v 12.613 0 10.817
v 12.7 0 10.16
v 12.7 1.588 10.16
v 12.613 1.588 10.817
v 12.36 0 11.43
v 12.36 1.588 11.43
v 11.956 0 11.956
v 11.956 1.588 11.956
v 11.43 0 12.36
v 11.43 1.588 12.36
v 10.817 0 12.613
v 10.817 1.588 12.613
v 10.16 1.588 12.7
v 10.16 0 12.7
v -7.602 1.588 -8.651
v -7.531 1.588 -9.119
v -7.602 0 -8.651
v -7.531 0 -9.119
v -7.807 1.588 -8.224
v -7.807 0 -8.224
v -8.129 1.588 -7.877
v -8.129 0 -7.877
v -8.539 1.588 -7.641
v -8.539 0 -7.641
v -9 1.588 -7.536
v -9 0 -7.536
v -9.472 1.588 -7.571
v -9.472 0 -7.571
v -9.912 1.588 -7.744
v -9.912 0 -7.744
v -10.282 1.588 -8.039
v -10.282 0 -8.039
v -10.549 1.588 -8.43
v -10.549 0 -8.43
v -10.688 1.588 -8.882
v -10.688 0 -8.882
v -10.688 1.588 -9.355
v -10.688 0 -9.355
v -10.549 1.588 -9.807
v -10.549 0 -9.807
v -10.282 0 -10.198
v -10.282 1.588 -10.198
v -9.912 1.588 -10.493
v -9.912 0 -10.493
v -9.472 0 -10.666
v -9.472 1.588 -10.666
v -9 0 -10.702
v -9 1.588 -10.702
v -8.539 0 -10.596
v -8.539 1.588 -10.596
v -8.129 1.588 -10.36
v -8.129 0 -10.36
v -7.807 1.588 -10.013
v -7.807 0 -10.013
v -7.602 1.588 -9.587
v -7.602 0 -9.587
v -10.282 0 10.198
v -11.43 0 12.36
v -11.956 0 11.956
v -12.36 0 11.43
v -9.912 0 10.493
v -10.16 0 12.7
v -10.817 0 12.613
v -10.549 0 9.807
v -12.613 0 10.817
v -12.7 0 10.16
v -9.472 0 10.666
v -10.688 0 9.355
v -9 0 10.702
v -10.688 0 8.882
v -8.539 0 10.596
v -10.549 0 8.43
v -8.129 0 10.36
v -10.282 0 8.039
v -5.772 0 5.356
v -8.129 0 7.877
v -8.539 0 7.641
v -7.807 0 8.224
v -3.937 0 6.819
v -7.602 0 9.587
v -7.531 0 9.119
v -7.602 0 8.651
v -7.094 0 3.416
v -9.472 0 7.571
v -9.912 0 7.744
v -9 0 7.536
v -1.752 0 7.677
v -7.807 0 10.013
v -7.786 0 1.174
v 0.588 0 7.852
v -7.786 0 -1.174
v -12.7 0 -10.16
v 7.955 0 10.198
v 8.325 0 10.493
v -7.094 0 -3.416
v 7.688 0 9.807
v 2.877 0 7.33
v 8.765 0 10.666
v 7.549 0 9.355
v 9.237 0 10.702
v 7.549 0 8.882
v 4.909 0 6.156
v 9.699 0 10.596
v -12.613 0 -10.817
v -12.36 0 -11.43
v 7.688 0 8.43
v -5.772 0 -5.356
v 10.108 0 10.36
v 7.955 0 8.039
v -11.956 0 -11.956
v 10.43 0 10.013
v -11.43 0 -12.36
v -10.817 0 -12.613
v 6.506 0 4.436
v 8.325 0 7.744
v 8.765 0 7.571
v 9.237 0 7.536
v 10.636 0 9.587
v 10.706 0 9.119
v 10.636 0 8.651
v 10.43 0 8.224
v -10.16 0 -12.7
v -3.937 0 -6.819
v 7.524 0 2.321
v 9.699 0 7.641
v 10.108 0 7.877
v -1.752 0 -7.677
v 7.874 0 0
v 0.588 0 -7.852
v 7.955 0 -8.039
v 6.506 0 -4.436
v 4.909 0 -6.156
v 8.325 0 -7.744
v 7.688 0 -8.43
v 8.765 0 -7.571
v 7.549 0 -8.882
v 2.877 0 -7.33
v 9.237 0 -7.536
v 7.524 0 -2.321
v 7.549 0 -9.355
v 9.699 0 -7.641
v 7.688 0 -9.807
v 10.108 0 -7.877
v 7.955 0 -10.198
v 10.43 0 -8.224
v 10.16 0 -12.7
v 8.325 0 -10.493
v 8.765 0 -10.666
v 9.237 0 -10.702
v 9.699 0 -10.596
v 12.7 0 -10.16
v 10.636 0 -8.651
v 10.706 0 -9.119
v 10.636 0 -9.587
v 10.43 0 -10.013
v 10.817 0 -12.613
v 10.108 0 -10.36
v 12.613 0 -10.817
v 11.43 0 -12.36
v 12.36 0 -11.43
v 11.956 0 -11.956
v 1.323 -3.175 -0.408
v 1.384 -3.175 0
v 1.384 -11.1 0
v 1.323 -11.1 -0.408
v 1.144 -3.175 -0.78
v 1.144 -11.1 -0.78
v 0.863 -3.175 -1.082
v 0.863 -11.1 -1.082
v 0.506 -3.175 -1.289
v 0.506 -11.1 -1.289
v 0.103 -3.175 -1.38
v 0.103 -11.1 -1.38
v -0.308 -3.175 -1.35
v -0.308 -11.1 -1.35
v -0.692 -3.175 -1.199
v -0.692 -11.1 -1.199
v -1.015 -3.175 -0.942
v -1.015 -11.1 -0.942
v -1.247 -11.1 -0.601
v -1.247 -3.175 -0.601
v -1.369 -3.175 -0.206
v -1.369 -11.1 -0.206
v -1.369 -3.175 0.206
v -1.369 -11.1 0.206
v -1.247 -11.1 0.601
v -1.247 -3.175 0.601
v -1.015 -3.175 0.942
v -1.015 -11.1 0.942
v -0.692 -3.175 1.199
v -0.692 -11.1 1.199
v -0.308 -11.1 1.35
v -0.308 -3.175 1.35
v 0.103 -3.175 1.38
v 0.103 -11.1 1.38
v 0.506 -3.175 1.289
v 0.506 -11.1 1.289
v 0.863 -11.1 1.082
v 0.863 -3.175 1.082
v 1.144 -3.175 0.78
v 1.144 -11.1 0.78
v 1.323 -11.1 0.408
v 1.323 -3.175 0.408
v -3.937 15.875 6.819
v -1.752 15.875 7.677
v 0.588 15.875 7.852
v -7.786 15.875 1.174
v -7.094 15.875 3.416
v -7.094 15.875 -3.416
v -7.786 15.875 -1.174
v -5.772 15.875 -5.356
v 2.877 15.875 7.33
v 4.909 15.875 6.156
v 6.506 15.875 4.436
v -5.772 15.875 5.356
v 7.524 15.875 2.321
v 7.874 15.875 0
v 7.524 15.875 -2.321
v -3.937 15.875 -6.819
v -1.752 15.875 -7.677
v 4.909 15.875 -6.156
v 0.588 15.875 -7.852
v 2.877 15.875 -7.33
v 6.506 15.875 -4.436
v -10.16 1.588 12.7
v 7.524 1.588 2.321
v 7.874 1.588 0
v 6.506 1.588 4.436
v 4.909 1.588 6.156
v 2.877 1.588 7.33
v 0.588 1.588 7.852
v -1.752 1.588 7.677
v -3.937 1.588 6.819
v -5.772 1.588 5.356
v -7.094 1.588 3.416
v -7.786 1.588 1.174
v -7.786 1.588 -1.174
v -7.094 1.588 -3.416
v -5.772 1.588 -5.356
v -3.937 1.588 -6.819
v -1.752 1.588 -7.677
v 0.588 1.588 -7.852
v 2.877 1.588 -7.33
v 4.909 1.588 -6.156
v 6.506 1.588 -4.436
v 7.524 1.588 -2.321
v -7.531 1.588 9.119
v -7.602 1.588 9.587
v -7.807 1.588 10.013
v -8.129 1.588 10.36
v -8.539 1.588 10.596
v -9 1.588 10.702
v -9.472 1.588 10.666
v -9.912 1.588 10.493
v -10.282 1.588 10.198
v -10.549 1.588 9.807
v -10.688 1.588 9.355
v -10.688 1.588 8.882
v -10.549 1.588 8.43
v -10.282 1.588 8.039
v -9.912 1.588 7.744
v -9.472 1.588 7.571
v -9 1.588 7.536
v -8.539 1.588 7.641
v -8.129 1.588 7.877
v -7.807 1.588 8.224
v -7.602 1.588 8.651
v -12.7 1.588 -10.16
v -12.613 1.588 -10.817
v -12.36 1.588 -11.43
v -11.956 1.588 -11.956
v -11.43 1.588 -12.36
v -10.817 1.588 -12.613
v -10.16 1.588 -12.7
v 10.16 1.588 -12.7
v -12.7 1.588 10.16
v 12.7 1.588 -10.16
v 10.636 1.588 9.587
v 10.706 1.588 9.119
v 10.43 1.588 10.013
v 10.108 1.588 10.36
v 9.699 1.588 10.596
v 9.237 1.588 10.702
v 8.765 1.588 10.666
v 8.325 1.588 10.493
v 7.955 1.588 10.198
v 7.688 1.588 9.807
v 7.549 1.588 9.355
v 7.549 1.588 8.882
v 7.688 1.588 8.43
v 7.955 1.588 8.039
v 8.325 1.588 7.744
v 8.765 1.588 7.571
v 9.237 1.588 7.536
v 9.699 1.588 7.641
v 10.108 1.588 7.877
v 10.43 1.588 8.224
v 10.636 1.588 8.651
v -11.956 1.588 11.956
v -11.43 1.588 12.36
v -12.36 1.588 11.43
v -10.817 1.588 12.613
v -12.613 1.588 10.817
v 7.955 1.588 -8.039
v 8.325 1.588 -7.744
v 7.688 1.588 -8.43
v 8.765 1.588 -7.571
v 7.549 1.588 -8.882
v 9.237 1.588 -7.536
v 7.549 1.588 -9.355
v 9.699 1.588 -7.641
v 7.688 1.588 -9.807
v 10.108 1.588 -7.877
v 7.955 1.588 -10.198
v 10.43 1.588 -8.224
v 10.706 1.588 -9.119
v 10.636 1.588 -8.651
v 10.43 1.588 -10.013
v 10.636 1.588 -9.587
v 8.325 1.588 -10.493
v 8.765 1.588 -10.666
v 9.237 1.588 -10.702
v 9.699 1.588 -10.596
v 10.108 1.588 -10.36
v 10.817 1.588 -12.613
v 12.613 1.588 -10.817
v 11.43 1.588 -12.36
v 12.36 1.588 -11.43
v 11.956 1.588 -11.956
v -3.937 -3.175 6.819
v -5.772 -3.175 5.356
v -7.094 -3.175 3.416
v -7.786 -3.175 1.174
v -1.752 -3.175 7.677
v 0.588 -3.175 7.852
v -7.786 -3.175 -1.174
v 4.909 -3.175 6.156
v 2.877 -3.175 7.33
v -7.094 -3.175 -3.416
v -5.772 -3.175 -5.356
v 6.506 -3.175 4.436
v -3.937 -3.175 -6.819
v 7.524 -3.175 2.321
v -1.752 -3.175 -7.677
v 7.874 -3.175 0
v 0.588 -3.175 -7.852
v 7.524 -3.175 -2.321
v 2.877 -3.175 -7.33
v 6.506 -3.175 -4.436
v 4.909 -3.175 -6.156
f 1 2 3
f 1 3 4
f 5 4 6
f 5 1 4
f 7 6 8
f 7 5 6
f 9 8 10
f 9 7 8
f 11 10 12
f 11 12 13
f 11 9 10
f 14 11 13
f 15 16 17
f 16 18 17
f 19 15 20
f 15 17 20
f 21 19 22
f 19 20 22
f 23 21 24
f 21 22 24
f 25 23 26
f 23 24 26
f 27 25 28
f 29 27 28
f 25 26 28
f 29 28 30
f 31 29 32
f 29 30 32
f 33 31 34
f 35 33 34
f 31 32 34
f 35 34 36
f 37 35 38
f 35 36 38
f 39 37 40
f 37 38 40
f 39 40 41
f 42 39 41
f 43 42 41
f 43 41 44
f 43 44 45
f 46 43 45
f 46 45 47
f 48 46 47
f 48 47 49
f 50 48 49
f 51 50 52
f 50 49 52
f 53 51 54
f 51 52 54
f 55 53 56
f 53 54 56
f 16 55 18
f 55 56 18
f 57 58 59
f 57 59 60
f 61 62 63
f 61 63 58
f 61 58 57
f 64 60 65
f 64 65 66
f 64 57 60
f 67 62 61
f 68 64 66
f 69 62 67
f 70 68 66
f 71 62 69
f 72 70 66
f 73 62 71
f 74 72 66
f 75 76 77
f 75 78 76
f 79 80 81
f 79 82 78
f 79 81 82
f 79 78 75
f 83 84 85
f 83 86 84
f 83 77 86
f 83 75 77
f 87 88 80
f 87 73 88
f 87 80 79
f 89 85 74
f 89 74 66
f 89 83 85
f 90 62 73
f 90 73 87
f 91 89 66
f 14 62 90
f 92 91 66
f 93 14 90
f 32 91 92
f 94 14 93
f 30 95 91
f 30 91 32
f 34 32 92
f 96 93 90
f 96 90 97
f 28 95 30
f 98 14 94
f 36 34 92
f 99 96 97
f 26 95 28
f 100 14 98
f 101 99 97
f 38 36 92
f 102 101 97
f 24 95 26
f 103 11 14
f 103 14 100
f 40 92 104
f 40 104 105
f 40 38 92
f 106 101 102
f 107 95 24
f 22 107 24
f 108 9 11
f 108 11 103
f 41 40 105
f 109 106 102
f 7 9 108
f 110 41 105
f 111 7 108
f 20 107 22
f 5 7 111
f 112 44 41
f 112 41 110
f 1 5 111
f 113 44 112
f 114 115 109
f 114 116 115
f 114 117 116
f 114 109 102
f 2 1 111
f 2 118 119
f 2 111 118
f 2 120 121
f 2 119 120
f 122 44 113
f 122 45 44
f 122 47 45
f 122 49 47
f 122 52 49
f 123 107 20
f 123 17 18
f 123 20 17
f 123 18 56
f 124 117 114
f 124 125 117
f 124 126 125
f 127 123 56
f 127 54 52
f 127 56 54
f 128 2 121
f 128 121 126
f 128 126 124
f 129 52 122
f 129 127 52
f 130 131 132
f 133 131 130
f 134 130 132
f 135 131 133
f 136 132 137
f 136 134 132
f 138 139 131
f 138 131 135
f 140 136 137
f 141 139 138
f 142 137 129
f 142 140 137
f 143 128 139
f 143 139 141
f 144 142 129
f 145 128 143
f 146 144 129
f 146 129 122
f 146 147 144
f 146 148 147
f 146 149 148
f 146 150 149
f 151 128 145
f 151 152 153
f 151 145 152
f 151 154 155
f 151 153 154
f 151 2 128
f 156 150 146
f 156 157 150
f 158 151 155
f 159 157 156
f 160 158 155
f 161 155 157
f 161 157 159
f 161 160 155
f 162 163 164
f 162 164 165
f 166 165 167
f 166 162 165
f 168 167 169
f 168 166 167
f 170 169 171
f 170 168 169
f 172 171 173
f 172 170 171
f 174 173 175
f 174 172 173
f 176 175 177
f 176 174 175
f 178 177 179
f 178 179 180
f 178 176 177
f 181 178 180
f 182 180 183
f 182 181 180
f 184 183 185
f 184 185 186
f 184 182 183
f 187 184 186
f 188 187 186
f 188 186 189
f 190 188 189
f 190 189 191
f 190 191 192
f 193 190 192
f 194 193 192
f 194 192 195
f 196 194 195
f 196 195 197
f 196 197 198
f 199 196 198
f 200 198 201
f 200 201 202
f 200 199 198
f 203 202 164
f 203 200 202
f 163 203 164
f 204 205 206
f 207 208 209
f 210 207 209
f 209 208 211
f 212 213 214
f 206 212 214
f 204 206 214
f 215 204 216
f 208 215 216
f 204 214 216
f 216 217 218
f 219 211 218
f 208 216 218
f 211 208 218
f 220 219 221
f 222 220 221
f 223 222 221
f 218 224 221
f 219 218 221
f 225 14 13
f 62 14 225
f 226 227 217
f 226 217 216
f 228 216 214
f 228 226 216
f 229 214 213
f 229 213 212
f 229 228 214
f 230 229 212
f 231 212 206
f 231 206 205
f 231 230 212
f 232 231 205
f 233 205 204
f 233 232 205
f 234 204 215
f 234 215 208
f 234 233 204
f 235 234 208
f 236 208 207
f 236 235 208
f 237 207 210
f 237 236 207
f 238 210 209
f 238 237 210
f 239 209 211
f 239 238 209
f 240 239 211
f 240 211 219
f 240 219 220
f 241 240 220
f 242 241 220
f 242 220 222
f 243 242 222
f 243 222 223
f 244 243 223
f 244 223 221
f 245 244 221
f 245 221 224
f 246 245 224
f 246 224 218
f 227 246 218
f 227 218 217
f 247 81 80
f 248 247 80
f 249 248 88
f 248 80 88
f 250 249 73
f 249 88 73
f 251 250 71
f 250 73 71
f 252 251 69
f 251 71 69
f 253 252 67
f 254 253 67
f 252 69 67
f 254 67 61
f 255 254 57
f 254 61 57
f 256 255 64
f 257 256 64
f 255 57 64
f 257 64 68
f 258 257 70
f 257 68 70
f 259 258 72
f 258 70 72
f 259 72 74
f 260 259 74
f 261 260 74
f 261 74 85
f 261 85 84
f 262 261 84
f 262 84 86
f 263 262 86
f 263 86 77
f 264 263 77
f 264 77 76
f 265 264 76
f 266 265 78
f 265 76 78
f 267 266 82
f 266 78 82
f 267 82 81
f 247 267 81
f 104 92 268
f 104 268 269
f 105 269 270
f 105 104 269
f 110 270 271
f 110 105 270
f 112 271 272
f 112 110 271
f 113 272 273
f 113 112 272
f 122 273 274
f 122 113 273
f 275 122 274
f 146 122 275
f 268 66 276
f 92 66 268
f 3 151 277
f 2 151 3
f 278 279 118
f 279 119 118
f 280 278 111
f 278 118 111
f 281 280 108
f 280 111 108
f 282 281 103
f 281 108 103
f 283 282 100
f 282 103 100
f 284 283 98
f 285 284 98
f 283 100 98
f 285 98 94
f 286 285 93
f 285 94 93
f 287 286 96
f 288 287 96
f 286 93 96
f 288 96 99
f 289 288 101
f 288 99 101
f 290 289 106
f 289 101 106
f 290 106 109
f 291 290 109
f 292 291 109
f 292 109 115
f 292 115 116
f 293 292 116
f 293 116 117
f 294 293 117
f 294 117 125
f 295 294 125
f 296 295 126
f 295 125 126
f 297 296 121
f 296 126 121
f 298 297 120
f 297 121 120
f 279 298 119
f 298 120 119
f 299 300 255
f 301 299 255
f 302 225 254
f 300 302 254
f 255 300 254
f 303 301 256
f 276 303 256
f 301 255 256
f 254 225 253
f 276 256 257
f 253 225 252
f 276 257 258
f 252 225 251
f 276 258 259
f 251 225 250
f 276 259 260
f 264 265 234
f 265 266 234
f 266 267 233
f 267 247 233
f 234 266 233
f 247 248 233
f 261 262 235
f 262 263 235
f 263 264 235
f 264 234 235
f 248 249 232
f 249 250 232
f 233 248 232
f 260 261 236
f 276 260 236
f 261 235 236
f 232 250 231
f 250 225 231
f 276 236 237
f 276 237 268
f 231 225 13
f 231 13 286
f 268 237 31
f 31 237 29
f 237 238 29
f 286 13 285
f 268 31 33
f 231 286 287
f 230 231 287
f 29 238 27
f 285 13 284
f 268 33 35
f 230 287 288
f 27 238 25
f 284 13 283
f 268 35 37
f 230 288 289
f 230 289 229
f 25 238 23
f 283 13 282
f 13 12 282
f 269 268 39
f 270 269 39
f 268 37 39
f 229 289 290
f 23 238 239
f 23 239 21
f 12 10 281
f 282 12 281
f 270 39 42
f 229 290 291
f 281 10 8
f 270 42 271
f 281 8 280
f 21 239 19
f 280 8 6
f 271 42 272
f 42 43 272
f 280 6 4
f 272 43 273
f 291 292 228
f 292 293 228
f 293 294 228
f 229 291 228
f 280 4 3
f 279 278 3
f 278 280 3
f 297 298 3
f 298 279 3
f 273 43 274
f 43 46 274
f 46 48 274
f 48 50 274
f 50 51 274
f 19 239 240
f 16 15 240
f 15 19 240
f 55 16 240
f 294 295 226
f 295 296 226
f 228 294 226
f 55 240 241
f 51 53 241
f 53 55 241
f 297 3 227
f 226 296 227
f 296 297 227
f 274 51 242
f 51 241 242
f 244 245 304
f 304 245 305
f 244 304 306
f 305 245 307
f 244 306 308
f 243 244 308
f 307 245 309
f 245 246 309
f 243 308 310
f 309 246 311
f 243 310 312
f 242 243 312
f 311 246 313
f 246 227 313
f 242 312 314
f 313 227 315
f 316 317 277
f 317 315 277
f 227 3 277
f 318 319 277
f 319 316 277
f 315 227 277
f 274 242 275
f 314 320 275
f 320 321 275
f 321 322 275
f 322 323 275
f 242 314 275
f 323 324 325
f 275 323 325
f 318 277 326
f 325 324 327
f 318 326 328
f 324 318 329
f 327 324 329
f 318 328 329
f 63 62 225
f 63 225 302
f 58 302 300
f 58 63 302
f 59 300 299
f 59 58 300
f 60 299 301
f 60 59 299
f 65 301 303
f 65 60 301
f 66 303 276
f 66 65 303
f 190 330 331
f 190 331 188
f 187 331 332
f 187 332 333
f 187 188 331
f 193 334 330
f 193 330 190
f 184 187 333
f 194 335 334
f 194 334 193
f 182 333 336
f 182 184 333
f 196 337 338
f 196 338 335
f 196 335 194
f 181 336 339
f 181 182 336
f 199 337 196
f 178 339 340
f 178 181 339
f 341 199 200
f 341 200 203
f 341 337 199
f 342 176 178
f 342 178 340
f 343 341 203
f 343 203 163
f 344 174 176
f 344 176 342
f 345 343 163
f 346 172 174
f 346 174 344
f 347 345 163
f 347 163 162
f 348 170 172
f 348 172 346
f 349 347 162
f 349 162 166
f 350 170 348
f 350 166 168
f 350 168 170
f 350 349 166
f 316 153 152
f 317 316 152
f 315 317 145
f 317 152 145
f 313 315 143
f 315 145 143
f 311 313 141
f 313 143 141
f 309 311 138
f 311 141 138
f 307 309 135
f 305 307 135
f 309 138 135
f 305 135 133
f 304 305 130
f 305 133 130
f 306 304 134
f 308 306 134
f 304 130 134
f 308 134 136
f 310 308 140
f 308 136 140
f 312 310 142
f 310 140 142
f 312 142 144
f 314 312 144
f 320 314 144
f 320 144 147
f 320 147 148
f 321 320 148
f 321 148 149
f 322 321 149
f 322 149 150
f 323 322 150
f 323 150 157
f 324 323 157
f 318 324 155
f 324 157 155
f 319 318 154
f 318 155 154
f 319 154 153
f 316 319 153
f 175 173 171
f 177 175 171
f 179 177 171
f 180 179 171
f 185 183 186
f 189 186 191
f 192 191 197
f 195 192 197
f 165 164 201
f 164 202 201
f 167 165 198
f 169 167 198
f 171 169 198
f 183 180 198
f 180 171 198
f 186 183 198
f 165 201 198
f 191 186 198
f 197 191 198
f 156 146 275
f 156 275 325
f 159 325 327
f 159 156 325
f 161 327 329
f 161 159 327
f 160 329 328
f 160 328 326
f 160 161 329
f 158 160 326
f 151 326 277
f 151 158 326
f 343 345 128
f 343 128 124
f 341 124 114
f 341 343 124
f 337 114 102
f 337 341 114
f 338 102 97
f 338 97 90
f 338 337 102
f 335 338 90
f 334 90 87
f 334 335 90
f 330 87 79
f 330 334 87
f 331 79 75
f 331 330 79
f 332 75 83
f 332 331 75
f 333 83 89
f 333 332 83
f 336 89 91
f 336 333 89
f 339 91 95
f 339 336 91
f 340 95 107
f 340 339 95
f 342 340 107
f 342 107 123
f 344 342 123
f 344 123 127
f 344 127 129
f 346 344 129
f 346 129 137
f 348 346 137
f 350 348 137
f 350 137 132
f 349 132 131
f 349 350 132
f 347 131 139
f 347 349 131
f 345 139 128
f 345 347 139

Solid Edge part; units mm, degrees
sketch "Sketch1" plane through (0, 0, 0) normal (0, -1, 0) x (1, 0, 0)
  line L0 (10.16, 12.7) -> (-10.16, 12.7)
  arc A0 (-10.16, 12.7) -> (-12.7, 10.16) centre (-10.16, 10.16) ccw
  line L1 (-12.7, 10.16) -> (-12.7, -10.16)
  arc A1 (-12.7, -10.16) -> (-10.16, -12.7) centre (-10.16, -10.16) ccw
  line L2 (-10.16, -12.7) -> (10.16, -12.7)
  arc A2 (10.16, -12.7) -> (12.7, -10.16) centre (10.16, -10.16) ccw
  line L3 (12.7, -10.16) -> (12.7, 10.16)
  arc A3 (12.7, 10.16) -> (10.16, 12.7) centre (10.16, 10.16) ccw
extrude "Protrusion1" add sketch "Sketch1" against normal blind 1.5875
sketch "Sketch2" plane through (0, 0, 0) normal (0, -1, 0) x (1, 0, 0)
  circle A0 centre (-9.1186, 9.1186) radius 1.5875
  circle A1 centre (9.1186, 9.1186) radius 1.5875
  circle A2 centre (9.1186, -9.1186) radius 1.5875
  circle A3 centre (-9.1186, -9.1186) radius 1.5875
  dimension "D1" = 3.175
extrude "Cutout1" cut sketch "Sketch2" against normal through all
sketch "Sketch3" plane through (0, 0, 0) normal (0, -1, 0) x (1, 0, 0)
  circle A0 centre (0, 0) radius 7.874
extrude "ExtrudedProtrusion_2" add sketch "Sketch3" against normal blind 15.875 and the other way blind 3.175
sketch "Sketch4" plane through (0, 15.875, 0) normal (0, 1, 0) x (1, 0, 0)
  circle A0 centre (0, 0) radius 1.3843
extrude "ExtrudedProtrusion_3" add sketch "Sketch4" against normal blind 26.9748
